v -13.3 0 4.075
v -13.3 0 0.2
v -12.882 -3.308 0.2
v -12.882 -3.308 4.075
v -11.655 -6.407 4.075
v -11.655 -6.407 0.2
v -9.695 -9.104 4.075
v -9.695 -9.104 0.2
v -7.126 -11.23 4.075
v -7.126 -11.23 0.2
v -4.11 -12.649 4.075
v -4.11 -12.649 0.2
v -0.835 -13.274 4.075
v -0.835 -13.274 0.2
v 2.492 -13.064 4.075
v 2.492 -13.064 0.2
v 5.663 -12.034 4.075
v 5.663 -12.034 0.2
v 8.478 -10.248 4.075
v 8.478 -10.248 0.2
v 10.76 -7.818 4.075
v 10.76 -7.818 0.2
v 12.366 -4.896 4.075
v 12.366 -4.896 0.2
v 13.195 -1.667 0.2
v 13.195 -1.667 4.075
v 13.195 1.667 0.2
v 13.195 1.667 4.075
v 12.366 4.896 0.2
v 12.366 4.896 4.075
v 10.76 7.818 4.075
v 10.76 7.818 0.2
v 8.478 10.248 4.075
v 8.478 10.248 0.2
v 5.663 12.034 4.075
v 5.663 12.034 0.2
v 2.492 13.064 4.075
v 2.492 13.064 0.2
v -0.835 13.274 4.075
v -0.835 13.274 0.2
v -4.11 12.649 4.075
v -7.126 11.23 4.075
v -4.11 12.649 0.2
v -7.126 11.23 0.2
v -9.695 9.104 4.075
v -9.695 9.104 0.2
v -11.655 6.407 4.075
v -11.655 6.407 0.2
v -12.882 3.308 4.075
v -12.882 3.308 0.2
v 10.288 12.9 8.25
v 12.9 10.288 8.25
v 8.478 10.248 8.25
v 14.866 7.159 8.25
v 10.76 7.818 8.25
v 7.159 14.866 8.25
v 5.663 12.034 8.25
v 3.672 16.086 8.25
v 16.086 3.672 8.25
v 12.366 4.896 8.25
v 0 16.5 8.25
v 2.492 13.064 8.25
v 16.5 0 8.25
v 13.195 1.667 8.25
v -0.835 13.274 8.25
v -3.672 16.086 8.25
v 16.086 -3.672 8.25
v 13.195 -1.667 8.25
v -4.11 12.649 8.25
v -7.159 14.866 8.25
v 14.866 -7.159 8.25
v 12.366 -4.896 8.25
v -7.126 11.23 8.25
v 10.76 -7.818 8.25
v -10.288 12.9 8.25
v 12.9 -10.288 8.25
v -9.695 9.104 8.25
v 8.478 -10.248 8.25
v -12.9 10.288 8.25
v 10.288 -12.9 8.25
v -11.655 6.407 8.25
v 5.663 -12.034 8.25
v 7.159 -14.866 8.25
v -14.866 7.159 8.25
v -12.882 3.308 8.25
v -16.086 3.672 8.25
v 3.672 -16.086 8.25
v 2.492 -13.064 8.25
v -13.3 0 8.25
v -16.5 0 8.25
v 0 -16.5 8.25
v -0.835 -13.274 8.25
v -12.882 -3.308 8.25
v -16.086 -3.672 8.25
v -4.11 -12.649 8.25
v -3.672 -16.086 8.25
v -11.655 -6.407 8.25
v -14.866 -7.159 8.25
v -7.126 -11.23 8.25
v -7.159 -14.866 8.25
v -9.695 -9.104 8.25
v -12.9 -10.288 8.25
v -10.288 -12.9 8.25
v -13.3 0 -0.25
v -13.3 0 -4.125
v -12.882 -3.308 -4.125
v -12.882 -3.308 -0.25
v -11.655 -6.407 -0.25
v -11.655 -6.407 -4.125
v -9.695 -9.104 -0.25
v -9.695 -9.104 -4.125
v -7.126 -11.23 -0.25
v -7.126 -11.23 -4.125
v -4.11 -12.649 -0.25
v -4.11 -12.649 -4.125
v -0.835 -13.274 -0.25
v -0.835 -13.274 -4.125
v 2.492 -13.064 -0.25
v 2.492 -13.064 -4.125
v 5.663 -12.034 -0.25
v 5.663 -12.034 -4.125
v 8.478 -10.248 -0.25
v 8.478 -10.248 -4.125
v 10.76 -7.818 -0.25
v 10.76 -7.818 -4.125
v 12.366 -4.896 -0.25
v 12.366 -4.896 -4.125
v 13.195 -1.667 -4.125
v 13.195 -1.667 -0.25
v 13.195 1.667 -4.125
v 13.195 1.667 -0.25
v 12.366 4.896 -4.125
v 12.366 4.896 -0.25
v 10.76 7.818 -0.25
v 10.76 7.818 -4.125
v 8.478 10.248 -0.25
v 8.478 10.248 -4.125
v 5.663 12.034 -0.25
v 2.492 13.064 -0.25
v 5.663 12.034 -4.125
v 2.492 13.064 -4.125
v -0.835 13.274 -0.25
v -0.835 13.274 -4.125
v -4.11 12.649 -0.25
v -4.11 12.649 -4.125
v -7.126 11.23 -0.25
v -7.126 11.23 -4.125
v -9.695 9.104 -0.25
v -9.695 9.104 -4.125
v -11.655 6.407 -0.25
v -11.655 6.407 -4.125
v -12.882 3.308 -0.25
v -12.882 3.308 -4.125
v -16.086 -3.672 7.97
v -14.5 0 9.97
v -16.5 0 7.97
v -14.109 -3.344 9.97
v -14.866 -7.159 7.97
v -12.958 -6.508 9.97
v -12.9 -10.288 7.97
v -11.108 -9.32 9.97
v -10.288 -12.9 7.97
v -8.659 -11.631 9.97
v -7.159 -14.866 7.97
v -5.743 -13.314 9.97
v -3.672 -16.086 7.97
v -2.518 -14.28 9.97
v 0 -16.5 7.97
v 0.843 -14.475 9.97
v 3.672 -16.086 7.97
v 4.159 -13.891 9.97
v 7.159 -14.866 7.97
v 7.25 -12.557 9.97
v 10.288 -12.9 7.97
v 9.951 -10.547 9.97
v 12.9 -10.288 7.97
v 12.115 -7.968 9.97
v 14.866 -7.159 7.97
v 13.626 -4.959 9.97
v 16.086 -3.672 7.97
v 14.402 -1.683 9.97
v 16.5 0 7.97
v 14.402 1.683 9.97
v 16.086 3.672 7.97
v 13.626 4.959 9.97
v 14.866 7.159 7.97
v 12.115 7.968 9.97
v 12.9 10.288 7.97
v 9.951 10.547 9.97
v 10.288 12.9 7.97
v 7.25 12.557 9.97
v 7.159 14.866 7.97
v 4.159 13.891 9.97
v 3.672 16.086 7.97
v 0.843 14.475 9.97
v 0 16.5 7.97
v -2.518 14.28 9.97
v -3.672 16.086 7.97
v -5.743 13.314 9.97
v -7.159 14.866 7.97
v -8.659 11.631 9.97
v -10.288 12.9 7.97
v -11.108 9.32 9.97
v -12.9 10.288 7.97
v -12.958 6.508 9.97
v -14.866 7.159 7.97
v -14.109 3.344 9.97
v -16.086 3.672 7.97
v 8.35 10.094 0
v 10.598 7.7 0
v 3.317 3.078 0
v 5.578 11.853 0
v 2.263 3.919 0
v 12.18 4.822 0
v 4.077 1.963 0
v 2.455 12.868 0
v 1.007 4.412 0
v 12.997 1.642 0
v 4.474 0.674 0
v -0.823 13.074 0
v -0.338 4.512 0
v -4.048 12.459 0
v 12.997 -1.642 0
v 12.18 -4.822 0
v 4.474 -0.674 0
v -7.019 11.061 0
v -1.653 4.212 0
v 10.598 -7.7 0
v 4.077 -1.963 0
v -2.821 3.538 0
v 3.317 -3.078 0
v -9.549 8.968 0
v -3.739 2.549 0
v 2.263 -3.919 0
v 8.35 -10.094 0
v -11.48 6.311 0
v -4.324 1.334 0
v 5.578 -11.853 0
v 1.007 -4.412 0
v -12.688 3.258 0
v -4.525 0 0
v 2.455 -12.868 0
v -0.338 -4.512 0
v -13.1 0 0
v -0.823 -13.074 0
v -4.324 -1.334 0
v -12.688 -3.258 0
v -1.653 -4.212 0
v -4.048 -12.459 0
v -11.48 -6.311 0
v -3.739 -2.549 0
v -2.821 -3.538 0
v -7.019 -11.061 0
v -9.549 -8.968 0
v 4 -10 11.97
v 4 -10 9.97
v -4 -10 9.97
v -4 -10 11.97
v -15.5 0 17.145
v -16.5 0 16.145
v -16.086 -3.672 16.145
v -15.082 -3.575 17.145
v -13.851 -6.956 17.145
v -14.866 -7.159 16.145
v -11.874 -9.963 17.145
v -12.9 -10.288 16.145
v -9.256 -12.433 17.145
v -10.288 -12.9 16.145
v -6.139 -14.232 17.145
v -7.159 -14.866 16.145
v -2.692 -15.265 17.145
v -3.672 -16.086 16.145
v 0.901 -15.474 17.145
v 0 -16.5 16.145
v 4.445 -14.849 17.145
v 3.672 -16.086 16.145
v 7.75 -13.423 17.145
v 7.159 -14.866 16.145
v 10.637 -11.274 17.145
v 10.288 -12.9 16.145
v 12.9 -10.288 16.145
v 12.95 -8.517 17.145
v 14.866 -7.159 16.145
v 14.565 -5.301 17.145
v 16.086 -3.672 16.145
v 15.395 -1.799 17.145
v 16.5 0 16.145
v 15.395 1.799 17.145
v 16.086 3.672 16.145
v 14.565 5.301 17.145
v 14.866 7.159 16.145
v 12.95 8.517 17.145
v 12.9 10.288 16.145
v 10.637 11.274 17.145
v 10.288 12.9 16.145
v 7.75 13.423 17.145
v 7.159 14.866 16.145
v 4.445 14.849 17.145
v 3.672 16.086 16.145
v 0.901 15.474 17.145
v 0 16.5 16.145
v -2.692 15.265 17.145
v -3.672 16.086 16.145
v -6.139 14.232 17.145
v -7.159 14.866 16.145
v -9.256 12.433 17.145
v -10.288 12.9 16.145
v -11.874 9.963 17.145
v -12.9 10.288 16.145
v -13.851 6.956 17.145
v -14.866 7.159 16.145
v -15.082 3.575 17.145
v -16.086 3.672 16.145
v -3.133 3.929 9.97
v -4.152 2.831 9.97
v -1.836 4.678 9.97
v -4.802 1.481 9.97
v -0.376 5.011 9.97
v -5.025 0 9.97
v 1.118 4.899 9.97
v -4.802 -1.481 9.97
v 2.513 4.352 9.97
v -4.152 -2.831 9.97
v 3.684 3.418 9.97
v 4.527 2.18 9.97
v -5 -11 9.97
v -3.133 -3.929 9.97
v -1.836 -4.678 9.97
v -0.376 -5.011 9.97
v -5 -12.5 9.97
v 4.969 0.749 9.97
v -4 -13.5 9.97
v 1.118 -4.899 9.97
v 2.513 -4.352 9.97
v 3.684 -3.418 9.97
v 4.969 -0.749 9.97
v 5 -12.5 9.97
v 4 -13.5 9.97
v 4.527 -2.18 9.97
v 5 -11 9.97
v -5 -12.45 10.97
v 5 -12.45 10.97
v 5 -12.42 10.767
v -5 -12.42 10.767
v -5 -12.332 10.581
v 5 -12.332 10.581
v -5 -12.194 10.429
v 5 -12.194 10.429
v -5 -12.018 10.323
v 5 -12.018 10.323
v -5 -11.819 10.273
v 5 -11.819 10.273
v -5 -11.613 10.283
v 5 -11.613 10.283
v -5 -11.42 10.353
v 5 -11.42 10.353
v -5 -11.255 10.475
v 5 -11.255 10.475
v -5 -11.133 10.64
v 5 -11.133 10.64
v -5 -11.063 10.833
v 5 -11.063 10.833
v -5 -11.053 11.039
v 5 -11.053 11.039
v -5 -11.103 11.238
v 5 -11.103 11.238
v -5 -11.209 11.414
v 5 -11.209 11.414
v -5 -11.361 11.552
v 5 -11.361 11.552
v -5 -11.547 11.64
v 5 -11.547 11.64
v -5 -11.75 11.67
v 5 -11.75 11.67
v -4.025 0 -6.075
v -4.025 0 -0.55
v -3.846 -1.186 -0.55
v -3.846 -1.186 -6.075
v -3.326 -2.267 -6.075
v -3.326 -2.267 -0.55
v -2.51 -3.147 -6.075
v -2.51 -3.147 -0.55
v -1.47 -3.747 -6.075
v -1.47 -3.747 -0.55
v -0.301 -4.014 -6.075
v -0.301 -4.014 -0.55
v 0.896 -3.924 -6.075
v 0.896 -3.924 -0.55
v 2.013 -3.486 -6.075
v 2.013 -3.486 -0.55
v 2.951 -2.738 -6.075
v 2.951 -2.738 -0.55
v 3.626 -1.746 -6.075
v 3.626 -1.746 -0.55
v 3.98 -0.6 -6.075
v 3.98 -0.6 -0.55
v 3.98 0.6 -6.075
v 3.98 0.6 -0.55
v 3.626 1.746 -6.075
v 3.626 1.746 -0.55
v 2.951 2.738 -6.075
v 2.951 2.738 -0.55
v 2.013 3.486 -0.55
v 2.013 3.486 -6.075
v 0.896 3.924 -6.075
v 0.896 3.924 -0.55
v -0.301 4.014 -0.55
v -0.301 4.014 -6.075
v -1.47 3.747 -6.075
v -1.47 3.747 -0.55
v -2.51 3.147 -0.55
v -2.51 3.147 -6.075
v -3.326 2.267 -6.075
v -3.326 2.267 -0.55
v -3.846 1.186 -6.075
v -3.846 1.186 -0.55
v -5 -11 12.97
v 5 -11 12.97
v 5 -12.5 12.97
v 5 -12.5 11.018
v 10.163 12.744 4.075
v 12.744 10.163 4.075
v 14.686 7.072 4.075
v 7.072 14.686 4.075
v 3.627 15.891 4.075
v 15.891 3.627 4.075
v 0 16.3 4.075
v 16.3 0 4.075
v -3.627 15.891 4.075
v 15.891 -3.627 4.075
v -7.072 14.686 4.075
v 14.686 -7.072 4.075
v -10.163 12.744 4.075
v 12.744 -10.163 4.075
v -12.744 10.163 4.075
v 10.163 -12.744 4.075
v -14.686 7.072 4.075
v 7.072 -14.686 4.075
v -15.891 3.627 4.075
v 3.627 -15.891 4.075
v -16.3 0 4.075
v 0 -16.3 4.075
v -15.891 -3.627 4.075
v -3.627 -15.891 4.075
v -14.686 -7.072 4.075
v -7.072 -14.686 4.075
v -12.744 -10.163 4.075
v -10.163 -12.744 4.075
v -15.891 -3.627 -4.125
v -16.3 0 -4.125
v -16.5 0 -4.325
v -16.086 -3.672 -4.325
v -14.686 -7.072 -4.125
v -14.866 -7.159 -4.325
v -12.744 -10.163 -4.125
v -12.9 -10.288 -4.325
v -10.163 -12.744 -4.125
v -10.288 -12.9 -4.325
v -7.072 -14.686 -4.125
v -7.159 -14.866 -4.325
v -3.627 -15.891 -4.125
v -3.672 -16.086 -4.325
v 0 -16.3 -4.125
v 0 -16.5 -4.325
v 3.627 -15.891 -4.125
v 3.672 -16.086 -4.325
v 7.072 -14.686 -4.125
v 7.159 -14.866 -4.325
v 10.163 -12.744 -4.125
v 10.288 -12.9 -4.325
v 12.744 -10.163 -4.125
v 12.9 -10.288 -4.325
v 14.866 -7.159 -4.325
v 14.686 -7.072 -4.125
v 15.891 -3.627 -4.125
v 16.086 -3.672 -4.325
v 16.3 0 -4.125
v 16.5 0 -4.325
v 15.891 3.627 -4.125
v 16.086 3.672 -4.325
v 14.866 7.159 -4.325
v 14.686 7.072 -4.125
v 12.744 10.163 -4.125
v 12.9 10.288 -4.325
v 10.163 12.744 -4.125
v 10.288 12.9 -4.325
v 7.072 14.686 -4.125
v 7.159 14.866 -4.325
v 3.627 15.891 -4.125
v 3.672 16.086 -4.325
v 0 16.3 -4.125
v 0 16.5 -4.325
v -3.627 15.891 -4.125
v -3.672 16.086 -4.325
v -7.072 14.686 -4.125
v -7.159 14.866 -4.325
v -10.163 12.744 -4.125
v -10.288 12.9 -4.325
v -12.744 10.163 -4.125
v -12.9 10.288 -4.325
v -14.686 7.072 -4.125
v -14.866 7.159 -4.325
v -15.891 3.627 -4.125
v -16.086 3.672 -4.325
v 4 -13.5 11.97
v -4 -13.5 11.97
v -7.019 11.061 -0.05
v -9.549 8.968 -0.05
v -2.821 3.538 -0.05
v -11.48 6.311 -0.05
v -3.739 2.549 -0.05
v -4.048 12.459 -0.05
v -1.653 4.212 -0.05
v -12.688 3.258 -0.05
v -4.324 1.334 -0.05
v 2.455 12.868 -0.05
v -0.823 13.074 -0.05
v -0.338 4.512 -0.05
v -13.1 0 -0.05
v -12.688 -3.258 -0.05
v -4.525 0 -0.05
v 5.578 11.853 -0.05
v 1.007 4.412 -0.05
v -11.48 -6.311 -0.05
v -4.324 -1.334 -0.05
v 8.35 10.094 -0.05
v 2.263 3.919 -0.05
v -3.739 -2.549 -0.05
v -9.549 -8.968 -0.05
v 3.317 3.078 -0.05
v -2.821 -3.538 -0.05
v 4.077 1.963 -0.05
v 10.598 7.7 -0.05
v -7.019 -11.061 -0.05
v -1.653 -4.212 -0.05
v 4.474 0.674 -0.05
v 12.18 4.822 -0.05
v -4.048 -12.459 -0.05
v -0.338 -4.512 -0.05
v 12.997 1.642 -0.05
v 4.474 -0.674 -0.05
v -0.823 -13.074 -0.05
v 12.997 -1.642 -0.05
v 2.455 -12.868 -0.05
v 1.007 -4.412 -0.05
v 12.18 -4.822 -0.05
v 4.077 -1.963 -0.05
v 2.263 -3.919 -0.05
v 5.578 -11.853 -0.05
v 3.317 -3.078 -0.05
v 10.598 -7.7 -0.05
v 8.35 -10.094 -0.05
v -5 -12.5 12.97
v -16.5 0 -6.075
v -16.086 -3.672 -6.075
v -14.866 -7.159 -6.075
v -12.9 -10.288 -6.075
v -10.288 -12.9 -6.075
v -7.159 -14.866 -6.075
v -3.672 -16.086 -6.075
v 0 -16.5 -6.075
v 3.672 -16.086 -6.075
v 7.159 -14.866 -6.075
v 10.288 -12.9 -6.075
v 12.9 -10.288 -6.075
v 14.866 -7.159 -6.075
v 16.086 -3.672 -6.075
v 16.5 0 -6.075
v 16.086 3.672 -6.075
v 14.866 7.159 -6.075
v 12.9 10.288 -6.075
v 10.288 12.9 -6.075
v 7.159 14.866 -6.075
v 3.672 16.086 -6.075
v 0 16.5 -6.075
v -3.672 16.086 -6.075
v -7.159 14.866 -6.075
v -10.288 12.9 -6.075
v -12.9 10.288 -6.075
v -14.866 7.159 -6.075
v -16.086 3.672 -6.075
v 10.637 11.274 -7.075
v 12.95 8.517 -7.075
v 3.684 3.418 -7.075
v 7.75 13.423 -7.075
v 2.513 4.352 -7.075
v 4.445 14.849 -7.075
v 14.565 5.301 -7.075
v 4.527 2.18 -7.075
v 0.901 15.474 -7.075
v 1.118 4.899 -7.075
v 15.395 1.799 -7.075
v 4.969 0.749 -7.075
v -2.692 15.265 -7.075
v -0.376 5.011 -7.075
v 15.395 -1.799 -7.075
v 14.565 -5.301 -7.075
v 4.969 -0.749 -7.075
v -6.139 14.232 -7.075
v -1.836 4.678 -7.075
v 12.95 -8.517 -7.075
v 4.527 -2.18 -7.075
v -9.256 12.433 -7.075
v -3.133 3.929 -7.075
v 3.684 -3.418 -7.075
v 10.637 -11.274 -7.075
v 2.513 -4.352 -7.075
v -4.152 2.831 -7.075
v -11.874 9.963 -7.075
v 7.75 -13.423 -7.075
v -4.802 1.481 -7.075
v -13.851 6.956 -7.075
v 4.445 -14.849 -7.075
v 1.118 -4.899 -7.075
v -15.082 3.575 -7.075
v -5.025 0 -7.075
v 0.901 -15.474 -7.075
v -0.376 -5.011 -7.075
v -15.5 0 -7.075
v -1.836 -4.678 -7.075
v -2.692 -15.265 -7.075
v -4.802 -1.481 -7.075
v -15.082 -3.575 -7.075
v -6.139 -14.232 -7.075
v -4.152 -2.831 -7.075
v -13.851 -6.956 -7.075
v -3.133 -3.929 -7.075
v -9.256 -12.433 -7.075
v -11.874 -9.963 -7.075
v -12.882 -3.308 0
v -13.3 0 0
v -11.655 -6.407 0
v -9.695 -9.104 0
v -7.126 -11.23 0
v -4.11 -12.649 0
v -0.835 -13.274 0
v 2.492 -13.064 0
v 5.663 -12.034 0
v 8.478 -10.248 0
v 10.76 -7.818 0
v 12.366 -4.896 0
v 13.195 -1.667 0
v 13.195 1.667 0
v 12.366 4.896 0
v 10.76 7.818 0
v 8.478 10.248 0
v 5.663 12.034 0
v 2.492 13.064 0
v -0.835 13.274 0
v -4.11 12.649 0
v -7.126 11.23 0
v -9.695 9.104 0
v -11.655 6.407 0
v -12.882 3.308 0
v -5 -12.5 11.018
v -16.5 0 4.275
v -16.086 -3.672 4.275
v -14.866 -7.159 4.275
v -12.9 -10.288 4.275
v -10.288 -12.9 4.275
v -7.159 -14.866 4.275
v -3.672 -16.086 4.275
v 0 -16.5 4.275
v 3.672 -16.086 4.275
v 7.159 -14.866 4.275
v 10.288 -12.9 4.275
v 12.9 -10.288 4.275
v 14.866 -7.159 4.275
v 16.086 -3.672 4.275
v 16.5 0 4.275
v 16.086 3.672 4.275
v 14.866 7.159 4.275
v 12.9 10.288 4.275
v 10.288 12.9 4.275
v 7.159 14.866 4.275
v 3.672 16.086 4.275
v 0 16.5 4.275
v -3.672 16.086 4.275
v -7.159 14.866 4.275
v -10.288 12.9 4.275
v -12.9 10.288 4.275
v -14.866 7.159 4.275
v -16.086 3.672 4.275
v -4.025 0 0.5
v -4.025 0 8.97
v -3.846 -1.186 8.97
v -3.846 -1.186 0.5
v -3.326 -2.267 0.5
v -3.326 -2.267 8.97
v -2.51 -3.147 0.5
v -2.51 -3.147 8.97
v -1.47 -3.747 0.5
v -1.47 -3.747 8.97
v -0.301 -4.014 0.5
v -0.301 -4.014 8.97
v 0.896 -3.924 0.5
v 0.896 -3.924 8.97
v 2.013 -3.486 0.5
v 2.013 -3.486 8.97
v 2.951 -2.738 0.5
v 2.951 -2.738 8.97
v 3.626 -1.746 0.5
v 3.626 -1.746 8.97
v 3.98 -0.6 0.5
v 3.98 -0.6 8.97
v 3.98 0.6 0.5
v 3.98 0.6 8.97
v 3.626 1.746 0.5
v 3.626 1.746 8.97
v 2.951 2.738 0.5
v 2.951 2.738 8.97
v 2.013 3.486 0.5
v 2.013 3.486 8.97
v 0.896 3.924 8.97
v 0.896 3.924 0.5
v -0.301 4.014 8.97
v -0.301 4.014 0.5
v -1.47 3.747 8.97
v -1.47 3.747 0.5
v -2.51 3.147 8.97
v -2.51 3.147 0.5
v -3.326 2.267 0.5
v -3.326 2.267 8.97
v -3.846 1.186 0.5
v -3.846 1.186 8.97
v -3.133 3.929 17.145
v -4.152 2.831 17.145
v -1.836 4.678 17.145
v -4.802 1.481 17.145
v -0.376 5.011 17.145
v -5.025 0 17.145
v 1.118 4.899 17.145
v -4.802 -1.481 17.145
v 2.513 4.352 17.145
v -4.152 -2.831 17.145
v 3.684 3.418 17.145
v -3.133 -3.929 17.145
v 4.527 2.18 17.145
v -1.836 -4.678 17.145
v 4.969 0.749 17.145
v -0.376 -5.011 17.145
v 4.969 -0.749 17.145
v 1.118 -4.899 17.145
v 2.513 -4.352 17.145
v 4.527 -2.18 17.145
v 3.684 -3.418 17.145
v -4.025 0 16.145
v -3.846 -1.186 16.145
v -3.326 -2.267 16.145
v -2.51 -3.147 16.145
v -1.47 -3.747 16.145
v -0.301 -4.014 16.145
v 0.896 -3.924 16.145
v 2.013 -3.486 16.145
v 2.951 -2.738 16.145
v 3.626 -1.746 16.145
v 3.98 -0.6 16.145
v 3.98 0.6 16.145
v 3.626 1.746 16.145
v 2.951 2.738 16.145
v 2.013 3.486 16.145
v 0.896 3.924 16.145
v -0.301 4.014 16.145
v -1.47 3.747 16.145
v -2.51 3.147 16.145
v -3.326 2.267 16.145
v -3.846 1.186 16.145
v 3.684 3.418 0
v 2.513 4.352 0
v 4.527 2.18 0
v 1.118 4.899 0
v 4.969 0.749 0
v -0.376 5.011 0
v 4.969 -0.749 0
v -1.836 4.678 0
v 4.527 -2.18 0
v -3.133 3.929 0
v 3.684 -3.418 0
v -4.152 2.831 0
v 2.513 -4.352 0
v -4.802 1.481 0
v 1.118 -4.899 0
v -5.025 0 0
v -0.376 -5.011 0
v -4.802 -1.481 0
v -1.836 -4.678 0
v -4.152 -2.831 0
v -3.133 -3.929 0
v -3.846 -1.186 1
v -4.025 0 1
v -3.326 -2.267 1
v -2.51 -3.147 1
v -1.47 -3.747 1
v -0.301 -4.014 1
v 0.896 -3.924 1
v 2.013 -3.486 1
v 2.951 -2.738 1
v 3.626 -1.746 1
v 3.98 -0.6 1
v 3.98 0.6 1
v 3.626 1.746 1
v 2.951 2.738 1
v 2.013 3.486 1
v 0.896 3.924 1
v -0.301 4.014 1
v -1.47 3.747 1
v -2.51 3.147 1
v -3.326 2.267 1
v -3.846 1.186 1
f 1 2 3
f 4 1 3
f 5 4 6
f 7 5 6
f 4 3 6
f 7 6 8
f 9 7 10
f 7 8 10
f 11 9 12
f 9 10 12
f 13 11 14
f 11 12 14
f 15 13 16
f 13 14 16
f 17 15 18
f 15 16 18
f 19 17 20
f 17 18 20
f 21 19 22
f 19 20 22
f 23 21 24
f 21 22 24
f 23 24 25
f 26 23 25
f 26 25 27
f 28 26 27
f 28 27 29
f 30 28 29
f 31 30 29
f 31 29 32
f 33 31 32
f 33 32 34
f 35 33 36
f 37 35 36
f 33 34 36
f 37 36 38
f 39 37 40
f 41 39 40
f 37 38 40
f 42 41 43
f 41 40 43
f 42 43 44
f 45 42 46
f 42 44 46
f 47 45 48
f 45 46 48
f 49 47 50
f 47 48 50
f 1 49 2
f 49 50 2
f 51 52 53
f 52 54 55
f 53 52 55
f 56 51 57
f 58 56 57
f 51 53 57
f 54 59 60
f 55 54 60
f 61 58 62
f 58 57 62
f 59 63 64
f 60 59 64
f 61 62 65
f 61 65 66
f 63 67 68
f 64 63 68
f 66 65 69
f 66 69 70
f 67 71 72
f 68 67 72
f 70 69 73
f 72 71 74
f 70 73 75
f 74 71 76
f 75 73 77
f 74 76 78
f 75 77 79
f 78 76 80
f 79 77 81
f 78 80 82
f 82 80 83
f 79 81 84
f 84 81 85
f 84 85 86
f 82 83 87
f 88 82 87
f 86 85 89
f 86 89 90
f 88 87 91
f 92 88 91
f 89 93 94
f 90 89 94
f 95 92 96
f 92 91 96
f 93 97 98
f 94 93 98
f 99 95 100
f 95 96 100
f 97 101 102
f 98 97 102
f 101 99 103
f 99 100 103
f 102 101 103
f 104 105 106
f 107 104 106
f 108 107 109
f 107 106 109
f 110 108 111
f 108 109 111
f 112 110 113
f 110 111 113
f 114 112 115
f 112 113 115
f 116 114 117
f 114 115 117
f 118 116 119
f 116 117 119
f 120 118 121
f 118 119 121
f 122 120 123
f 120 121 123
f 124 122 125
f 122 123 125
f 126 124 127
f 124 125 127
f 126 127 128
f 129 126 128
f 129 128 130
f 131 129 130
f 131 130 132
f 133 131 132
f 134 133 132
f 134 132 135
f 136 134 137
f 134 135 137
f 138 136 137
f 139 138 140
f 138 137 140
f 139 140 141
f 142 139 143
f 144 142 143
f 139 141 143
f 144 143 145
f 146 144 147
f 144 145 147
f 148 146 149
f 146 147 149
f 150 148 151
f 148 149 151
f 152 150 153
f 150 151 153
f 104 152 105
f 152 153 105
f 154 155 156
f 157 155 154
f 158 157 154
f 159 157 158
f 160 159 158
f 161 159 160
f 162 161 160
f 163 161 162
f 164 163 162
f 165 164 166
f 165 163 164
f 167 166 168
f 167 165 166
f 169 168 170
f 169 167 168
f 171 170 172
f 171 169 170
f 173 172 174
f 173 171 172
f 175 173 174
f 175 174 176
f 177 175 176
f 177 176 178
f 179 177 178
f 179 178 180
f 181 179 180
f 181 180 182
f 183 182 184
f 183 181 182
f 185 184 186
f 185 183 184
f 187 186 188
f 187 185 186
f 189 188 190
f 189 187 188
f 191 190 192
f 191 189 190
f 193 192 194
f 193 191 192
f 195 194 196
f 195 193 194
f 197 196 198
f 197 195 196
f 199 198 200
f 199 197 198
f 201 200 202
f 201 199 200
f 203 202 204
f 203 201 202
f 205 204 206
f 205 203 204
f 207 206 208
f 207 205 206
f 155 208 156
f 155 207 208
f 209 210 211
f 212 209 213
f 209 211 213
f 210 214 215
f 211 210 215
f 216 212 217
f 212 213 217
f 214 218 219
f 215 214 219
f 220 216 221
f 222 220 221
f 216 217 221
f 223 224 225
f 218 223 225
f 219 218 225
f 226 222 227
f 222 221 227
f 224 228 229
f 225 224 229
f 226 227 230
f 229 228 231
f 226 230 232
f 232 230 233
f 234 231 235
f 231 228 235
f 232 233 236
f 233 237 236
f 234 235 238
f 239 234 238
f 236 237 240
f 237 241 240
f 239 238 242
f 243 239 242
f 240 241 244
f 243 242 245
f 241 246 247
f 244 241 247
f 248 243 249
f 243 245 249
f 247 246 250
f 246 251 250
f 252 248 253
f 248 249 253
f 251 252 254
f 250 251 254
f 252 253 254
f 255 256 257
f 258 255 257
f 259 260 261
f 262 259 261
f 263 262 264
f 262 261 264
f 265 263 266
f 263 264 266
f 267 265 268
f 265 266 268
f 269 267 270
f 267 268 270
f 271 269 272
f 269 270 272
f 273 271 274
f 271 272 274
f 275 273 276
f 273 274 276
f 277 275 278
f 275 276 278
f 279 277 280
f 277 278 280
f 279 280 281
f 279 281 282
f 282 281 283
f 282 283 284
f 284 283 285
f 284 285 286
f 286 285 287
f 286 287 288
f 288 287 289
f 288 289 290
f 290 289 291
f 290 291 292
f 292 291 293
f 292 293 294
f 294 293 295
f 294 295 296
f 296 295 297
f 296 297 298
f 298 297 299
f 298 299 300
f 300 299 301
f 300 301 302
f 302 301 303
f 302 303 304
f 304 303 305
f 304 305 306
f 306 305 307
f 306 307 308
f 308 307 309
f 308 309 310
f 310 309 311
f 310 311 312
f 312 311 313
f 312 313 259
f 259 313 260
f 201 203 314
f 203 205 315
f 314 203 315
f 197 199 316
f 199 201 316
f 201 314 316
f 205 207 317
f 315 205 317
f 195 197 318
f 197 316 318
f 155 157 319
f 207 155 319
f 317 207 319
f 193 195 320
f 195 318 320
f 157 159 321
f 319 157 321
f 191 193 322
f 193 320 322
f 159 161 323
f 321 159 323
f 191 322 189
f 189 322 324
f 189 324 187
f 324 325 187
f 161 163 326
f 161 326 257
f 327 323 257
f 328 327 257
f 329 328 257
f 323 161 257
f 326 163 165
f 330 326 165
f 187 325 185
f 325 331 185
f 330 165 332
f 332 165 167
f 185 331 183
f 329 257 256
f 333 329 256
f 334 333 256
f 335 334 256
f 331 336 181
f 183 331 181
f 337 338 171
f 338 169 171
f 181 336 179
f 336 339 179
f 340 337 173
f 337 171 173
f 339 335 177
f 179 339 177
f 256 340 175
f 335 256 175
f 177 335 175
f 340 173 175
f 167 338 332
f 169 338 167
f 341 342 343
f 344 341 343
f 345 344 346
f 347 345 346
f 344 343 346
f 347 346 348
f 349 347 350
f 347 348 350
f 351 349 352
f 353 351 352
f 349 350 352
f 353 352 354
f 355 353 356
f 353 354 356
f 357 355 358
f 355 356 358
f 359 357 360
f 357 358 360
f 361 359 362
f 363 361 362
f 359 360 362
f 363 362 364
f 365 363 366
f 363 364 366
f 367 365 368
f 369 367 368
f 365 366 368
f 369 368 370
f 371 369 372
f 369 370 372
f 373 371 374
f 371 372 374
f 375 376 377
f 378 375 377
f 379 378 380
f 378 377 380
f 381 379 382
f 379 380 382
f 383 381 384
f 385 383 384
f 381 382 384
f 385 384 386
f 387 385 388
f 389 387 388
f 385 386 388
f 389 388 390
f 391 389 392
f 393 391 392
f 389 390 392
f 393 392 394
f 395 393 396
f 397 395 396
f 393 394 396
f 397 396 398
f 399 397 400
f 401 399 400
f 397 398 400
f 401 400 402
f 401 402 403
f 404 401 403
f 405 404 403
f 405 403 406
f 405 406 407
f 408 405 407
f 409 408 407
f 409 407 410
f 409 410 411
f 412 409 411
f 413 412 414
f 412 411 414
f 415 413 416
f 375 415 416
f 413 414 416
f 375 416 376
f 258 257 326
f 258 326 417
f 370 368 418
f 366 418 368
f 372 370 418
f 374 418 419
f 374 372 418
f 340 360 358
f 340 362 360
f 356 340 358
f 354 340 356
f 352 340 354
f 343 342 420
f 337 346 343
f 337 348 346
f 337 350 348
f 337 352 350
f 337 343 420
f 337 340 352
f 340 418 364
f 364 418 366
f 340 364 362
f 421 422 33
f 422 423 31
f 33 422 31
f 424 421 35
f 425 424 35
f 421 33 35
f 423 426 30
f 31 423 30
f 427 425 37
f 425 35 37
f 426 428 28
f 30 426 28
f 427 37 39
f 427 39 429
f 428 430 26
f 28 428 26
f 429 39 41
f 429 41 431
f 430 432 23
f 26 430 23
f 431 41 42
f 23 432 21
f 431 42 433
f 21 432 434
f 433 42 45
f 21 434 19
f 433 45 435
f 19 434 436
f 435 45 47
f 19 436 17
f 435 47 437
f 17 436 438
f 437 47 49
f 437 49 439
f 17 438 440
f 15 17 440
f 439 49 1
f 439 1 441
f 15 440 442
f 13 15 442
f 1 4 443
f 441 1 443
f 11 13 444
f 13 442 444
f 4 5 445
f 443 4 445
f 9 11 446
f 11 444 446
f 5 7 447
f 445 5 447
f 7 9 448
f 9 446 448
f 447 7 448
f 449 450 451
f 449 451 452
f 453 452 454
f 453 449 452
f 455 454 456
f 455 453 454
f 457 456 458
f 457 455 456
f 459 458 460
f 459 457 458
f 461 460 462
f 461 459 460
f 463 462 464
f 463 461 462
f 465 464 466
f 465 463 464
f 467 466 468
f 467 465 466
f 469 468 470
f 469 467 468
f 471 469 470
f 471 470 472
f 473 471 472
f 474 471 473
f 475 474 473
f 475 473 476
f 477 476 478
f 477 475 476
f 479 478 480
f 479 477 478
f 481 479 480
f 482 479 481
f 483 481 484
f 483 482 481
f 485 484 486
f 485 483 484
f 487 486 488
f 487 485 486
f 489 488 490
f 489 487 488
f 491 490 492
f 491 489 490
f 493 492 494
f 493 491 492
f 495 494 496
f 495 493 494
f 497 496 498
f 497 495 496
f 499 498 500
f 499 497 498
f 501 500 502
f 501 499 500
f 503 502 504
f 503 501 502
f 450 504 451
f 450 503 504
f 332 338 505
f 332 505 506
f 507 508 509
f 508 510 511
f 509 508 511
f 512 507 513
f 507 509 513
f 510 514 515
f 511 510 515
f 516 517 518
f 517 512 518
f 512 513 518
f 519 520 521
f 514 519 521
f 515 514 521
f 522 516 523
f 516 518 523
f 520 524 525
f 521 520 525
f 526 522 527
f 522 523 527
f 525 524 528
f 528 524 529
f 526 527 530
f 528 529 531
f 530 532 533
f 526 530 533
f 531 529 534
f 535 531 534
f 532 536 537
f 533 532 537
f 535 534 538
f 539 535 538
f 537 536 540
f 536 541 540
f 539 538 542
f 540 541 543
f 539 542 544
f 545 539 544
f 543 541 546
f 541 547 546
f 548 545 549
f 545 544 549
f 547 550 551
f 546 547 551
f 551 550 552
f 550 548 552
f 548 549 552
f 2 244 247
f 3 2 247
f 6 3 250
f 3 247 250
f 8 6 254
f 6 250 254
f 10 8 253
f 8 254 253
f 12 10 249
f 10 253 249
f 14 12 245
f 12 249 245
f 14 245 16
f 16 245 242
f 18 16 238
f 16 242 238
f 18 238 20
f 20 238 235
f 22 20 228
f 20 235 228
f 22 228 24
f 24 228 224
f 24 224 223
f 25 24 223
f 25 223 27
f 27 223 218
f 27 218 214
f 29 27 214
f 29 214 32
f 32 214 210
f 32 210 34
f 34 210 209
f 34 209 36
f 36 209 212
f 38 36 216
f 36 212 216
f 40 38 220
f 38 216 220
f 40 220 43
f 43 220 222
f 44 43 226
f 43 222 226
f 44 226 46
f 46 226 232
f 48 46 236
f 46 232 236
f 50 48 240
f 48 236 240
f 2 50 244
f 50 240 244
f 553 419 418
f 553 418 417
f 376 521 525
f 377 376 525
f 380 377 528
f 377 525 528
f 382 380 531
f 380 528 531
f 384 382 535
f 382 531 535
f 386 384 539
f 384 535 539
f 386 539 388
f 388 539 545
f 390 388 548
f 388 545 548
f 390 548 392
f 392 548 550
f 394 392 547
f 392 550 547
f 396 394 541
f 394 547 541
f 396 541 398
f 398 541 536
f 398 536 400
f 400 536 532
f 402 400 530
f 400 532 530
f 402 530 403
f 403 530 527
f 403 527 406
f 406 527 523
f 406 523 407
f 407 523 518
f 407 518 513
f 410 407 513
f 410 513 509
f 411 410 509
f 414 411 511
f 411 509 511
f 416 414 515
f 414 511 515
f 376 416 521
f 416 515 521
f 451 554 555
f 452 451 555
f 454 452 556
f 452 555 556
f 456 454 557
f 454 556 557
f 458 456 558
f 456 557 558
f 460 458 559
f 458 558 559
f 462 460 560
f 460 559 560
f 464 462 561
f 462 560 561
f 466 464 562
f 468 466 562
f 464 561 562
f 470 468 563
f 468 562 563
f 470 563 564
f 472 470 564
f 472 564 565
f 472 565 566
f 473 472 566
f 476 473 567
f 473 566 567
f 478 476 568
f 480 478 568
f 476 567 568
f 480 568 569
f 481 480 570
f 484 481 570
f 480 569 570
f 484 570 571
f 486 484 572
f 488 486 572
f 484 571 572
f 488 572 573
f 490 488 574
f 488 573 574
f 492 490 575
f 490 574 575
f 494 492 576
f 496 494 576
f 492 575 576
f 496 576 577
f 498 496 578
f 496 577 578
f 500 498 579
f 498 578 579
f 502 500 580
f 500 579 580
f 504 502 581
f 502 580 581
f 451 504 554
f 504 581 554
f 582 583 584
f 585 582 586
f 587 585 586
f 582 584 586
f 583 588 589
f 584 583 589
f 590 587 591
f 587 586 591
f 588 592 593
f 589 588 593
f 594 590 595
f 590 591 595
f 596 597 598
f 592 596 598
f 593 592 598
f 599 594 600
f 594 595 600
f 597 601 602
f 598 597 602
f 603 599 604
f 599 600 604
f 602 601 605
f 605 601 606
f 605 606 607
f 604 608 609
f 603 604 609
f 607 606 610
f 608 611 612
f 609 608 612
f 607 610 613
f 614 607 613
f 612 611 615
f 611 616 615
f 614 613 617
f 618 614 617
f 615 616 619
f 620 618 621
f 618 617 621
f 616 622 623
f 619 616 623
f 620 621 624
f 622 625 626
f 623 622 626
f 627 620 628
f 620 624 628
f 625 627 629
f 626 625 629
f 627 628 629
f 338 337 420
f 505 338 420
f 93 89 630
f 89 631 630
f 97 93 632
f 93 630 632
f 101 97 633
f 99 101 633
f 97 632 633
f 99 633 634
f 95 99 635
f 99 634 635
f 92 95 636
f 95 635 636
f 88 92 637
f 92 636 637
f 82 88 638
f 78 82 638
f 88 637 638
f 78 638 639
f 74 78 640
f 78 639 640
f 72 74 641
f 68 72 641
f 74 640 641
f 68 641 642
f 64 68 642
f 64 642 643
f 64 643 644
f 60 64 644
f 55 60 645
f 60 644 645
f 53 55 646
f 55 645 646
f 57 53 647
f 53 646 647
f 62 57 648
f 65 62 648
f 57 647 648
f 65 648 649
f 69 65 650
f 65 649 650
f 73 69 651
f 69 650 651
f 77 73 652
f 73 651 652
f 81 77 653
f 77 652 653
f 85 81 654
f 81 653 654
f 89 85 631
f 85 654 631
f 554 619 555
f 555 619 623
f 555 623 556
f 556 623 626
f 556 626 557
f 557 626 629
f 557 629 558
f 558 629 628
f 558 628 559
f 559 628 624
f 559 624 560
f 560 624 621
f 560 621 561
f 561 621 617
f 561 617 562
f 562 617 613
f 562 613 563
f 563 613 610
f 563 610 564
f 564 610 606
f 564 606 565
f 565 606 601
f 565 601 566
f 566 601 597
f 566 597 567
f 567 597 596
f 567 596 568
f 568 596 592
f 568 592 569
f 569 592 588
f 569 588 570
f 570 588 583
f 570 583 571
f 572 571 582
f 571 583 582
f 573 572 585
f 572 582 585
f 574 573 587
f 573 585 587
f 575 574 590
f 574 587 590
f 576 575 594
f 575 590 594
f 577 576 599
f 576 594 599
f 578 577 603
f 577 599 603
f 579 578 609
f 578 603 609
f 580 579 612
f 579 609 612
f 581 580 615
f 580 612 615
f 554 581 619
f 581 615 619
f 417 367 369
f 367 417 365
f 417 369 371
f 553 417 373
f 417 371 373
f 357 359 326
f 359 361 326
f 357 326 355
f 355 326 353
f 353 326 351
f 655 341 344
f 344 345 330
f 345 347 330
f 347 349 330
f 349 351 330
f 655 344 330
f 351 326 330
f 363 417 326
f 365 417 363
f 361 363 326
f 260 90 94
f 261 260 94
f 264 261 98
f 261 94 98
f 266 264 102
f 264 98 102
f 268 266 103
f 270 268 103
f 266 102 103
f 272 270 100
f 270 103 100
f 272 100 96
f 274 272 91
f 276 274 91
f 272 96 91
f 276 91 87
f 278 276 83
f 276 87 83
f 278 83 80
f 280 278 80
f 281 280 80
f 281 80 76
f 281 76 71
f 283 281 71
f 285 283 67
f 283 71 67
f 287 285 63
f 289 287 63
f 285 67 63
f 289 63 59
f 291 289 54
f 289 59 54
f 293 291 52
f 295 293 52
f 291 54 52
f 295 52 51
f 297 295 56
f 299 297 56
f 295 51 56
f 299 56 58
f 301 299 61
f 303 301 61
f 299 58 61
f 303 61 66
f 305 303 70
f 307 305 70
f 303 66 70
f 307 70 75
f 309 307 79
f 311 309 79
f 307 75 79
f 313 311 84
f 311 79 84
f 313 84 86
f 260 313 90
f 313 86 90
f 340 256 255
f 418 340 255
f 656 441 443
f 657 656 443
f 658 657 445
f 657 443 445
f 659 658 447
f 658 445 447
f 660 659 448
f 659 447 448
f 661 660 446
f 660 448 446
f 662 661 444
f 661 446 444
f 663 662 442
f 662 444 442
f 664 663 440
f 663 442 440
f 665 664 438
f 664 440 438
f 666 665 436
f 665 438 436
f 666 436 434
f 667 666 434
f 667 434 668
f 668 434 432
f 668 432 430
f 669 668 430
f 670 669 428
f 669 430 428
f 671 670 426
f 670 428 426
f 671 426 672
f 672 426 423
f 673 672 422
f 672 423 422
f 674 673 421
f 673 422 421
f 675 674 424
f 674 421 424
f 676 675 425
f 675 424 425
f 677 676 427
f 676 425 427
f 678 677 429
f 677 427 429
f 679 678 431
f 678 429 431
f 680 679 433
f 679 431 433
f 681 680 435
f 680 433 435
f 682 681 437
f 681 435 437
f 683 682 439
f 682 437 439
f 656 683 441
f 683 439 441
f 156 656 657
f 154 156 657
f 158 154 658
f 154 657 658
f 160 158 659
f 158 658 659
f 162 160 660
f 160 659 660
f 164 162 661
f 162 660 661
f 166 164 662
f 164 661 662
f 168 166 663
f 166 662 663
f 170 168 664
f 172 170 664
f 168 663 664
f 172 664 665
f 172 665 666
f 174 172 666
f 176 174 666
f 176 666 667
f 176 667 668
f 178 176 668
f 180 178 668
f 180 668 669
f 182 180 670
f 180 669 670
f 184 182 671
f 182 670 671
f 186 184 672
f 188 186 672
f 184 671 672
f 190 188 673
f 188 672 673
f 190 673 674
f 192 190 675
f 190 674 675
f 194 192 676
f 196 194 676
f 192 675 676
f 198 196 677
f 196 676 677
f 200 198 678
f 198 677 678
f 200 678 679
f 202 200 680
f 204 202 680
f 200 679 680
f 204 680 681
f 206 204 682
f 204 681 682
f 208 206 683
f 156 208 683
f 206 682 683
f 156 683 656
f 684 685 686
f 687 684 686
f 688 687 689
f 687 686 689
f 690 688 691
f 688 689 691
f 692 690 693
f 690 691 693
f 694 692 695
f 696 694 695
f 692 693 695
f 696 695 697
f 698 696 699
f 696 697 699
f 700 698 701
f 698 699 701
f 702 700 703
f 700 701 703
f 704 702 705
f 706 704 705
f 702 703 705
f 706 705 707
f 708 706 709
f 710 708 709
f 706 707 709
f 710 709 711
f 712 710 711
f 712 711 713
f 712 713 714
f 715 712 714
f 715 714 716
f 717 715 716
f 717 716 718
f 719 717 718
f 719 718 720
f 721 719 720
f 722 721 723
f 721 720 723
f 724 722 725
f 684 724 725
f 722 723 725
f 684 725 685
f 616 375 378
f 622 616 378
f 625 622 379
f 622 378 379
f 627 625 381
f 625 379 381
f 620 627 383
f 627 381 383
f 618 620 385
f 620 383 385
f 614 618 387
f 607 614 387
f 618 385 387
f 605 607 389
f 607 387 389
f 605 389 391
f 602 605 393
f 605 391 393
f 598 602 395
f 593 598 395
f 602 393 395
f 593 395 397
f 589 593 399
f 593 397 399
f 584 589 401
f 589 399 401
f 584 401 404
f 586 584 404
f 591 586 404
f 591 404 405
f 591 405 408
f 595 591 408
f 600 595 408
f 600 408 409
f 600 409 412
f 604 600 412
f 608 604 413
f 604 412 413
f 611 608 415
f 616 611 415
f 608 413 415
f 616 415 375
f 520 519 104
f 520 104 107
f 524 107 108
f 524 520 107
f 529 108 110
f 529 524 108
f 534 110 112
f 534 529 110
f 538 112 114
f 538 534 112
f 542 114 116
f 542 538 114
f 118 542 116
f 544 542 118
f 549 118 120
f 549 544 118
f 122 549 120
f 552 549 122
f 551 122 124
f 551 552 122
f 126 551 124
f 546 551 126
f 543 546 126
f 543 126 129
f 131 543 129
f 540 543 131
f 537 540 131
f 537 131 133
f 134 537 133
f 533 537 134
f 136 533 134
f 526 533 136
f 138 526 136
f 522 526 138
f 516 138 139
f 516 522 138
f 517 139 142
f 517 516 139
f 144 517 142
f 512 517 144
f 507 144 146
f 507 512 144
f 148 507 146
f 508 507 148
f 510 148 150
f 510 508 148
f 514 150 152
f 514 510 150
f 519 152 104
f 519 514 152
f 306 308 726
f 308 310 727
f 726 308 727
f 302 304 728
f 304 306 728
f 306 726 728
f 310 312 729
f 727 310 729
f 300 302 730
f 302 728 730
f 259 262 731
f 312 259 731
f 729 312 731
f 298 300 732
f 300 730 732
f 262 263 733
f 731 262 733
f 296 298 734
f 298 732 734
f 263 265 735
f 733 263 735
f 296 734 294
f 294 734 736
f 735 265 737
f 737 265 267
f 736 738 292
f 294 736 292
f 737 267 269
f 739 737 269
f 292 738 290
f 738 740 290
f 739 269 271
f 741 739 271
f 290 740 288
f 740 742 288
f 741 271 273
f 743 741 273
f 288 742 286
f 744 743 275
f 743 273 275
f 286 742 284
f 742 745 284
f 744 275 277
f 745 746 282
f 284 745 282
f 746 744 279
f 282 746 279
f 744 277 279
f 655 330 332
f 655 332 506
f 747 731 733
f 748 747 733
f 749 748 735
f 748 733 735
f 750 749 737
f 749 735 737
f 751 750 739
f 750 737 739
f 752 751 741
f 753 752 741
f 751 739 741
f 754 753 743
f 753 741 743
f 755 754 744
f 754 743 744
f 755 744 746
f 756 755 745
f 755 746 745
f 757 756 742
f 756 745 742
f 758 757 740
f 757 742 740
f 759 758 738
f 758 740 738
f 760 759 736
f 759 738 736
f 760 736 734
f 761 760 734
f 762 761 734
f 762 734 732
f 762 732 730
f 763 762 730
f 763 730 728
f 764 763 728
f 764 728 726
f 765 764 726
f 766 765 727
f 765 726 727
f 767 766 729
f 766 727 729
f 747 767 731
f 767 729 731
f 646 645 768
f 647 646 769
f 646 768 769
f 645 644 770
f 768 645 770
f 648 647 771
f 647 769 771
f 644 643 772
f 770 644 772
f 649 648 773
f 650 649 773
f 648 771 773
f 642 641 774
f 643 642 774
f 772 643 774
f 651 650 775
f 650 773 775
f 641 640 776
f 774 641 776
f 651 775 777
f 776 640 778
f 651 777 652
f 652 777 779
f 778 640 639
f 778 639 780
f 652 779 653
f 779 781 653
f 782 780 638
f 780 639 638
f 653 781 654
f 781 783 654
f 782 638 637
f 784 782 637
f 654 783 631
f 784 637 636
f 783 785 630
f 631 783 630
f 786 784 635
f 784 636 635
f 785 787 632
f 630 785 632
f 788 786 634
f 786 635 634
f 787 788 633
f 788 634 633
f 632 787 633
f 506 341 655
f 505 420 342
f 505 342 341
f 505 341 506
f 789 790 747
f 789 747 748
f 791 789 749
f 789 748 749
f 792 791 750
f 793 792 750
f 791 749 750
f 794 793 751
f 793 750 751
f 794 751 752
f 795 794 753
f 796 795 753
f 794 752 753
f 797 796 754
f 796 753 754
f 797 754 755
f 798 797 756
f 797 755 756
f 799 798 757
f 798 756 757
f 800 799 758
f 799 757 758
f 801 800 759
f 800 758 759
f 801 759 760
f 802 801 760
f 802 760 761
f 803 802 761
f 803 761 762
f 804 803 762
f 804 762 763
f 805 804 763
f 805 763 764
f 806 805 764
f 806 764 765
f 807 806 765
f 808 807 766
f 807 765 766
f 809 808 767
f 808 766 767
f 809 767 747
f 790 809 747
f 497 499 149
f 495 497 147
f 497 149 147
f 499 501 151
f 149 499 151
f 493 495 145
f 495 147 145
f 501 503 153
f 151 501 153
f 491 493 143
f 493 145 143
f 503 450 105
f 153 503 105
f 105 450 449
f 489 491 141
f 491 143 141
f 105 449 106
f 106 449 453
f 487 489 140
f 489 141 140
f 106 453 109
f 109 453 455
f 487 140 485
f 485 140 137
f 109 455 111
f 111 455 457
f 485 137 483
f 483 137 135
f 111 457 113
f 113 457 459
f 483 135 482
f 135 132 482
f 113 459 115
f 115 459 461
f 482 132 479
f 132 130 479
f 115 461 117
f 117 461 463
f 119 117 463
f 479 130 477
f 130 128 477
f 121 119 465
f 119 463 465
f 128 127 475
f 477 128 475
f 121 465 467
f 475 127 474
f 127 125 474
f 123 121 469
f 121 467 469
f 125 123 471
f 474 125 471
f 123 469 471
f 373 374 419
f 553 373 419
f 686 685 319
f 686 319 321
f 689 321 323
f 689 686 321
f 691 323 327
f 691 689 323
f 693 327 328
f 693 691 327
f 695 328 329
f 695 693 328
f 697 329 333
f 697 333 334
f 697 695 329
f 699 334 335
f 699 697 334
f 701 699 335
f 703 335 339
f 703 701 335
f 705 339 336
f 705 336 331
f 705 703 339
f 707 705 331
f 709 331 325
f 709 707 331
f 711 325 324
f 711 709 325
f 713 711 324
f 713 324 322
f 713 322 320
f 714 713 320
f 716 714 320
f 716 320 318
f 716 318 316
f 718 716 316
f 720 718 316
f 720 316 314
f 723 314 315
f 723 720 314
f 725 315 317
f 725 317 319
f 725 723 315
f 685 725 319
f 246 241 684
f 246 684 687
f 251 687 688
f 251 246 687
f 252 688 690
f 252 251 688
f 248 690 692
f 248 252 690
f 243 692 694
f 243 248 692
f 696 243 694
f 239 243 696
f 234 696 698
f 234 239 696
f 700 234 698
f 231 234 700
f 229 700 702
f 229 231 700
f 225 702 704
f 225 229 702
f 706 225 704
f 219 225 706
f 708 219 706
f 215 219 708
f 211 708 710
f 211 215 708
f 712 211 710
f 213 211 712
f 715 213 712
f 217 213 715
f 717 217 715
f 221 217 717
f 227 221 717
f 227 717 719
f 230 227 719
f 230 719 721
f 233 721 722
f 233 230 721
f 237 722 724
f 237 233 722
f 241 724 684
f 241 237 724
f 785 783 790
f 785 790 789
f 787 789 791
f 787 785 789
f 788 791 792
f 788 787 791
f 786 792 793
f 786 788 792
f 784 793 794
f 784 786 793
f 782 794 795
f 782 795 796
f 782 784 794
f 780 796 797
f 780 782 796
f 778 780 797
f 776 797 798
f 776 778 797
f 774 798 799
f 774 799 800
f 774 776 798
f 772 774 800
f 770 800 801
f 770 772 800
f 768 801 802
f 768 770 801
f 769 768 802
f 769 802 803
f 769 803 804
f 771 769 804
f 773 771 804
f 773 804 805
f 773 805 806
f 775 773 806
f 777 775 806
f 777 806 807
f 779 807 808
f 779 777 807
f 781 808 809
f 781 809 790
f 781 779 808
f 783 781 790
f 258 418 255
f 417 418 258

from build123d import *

# Parameters (mm, degrees)
CHAMFER_SIZE    = 1
CHAMFER003_SIZE = 0.2
CHAMFER004_SIZE = 2
SKETCH003_W     = 10
SKETCH003_H     = 3.5
PAD_DEPTH       = 3
POCKET_DEPTH    = 10
CHAMFER005_SIZE = 1
CHAMFER006_SIZE = 1
CHAMFER007_SIZE = 0.5
CHAMFER001_SIZE = 1
CHAMFER002_SIZE = 0.2
CHAMFER008_SIZE = 0.5


with BuildPart() as body:
    # Sketch → Revolution (revolve)
    with BuildSketch(Plane.XZ):
        Polygon((-4.025, 0), (-4.025, 17.145), (-16.5, 17.145), (-16.5, 8.25), (-13.3, 8.25), (-13.3, 0), align=None)
    revolve(axis=Axis((0, 0, 0), (0, 0, 1)))

    # Chamfer
    chamfer_edges = [body.edges().sort_by_distance(p)[0] for p in [
        (16.5, 0, 17.145),
        (4.025, 0, 17.145),
        (4.025, 0, 0),
    ]]
    chamfer(chamfer_edges, length=CHAMFER_SIZE)


with BuildPart() as bushing_top:
    # Sketch001 → Revolution001 (revolve)
    with BuildSketch(Plane.XZ):
        Polygon((-4.025, 0), (-4.025, 9.97), (-16.5, 9.97), (-16.5, 4.075), (-13.3, 4.075), (-13.3, 0), align=None)
    revolve(axis=Axis((0, 0, 0), (0, 0, 1)))

    # Chamfer003
    chamfer003_edges = [bushing_top.edges().sort_by_distance(p)[0] for p in [
        (13.3, 0, 0),
        (16.5, 0, 4.075),
    ]]
    chamfer(chamfer003_edges, length=CHAMFER003_SIZE)

    # Chamfer004
    chamfer004_edges = [bushing_top.edges().sort_by_distance(p)[0] for p in [
        (16.5, 0, 9.97),
    ]]
    chamfer(chamfer004_edges, length=CHAMFER004_SIZE)

    # Sketch003 (on Face4 of Chamfer004) → Pad (new body)
    with BuildSketch(Plane(origin=(0, 0, 9.97), x_dir=(-1, 0, 0), z_dir=(0, 0, 1))):
        with Locations((0, 11.75)):
            Rectangle(SKETCH003_W, SKETCH003_H)
    extrude(amount=PAD_DEPTH)

    # Sketch004 (on Face10 of Pad) → Pocket (cut)
    with BuildSketch(Plane(origin=(5, 0, 0), x_dir=(0, 0, 1), z_dir=(1, 0, 0))):
        with BuildLine():
            ThreePointArc((10.97, 12.45), (10.475025, 11.255025), (11.67, 11.75))
            Line((11.67, 11.75), (12.97, 12.5))
            Line((12.97, 12.5), (12.97, 13.5))
            Line((12.97, 13.5), (11.97, 13.5))
            Line((10.97, 12.45), (11.97, 13.5))
        make_face()
    extrude(amount=-POCKET_DEPTH, mode=Mode.SUBTRACT)

    # Chamfer005
    chamfer005_edges = [bushing_top.edges().sort_by_distance(p)[0] for p in [
        (0, -10, 12.97),
        (5, -10, 11.47),
        (-5, -10, 11.47),
        (5, -13.5, 10.97),
        (-5, -13.5, 10.97),
    ]]
    chamfer(chamfer005_edges, length=CHAMFER005_SIZE)

    # Chamfer006
    chamfer006_edges = [bushing_top.edges().sort_by_distance(p)[0] for p in [
        (4.025, 0, 9.97),
    ]]
    chamfer(chamfer006_edges, length=CHAMFER006_SIZE)

    # Chamfer007
    chamfer007_edges = [bushing_top.edges().sort_by_distance(p)[0] for p in [
        (4.025, 0, 0),
    ]]
    chamfer(chamfer007_edges, length=CHAMFER007_SIZE)


with BuildPart() as bushing_bottom:
    # Sketch002 → Revolution002 (revolve)
    with BuildSketch(Plane.XZ):
        Polygon((-4.025, -0.05), (-13.3, -0.05), (-13.3, -4.125), (-16.5, -4.125), (-16.5, -7.075), (-4.025, -7.075), align=None)
    revolve(axis=Axis((0, 0, 0), (0, 0, 1)))

    # Chamfer001
    chamfer001_edges = [bushing_bottom.edges().sort_by_distance(p)[0] for p in [
        (4.025, 0, -7.075),
        (16.5, 0, -7.075),
    ]]
    chamfer(chamfer001_edges, length=CHAMFER001_SIZE)

    # Chamfer002
    chamfer002_edges = [bushing_bottom.edges().sort_by_distance(p)[0] for p in [
        (13.3, 0, -0.05),
        (16.5, 0, -4.125),
    ]]
    chamfer(chamfer002_edges, length=CHAMFER002_SIZE)

    # Chamfer008
    chamfer008_edges = [bushing_bottom.edges().sort_by_distance(p)[0] for p in [
        (4.025, 0, -0.05),
    ]]
    chamfer(chamfer008_edges, length=CHAMFER008_SIZE)


solid = Compound([body.part, bushing_top.part, bushing_bottom.part])
